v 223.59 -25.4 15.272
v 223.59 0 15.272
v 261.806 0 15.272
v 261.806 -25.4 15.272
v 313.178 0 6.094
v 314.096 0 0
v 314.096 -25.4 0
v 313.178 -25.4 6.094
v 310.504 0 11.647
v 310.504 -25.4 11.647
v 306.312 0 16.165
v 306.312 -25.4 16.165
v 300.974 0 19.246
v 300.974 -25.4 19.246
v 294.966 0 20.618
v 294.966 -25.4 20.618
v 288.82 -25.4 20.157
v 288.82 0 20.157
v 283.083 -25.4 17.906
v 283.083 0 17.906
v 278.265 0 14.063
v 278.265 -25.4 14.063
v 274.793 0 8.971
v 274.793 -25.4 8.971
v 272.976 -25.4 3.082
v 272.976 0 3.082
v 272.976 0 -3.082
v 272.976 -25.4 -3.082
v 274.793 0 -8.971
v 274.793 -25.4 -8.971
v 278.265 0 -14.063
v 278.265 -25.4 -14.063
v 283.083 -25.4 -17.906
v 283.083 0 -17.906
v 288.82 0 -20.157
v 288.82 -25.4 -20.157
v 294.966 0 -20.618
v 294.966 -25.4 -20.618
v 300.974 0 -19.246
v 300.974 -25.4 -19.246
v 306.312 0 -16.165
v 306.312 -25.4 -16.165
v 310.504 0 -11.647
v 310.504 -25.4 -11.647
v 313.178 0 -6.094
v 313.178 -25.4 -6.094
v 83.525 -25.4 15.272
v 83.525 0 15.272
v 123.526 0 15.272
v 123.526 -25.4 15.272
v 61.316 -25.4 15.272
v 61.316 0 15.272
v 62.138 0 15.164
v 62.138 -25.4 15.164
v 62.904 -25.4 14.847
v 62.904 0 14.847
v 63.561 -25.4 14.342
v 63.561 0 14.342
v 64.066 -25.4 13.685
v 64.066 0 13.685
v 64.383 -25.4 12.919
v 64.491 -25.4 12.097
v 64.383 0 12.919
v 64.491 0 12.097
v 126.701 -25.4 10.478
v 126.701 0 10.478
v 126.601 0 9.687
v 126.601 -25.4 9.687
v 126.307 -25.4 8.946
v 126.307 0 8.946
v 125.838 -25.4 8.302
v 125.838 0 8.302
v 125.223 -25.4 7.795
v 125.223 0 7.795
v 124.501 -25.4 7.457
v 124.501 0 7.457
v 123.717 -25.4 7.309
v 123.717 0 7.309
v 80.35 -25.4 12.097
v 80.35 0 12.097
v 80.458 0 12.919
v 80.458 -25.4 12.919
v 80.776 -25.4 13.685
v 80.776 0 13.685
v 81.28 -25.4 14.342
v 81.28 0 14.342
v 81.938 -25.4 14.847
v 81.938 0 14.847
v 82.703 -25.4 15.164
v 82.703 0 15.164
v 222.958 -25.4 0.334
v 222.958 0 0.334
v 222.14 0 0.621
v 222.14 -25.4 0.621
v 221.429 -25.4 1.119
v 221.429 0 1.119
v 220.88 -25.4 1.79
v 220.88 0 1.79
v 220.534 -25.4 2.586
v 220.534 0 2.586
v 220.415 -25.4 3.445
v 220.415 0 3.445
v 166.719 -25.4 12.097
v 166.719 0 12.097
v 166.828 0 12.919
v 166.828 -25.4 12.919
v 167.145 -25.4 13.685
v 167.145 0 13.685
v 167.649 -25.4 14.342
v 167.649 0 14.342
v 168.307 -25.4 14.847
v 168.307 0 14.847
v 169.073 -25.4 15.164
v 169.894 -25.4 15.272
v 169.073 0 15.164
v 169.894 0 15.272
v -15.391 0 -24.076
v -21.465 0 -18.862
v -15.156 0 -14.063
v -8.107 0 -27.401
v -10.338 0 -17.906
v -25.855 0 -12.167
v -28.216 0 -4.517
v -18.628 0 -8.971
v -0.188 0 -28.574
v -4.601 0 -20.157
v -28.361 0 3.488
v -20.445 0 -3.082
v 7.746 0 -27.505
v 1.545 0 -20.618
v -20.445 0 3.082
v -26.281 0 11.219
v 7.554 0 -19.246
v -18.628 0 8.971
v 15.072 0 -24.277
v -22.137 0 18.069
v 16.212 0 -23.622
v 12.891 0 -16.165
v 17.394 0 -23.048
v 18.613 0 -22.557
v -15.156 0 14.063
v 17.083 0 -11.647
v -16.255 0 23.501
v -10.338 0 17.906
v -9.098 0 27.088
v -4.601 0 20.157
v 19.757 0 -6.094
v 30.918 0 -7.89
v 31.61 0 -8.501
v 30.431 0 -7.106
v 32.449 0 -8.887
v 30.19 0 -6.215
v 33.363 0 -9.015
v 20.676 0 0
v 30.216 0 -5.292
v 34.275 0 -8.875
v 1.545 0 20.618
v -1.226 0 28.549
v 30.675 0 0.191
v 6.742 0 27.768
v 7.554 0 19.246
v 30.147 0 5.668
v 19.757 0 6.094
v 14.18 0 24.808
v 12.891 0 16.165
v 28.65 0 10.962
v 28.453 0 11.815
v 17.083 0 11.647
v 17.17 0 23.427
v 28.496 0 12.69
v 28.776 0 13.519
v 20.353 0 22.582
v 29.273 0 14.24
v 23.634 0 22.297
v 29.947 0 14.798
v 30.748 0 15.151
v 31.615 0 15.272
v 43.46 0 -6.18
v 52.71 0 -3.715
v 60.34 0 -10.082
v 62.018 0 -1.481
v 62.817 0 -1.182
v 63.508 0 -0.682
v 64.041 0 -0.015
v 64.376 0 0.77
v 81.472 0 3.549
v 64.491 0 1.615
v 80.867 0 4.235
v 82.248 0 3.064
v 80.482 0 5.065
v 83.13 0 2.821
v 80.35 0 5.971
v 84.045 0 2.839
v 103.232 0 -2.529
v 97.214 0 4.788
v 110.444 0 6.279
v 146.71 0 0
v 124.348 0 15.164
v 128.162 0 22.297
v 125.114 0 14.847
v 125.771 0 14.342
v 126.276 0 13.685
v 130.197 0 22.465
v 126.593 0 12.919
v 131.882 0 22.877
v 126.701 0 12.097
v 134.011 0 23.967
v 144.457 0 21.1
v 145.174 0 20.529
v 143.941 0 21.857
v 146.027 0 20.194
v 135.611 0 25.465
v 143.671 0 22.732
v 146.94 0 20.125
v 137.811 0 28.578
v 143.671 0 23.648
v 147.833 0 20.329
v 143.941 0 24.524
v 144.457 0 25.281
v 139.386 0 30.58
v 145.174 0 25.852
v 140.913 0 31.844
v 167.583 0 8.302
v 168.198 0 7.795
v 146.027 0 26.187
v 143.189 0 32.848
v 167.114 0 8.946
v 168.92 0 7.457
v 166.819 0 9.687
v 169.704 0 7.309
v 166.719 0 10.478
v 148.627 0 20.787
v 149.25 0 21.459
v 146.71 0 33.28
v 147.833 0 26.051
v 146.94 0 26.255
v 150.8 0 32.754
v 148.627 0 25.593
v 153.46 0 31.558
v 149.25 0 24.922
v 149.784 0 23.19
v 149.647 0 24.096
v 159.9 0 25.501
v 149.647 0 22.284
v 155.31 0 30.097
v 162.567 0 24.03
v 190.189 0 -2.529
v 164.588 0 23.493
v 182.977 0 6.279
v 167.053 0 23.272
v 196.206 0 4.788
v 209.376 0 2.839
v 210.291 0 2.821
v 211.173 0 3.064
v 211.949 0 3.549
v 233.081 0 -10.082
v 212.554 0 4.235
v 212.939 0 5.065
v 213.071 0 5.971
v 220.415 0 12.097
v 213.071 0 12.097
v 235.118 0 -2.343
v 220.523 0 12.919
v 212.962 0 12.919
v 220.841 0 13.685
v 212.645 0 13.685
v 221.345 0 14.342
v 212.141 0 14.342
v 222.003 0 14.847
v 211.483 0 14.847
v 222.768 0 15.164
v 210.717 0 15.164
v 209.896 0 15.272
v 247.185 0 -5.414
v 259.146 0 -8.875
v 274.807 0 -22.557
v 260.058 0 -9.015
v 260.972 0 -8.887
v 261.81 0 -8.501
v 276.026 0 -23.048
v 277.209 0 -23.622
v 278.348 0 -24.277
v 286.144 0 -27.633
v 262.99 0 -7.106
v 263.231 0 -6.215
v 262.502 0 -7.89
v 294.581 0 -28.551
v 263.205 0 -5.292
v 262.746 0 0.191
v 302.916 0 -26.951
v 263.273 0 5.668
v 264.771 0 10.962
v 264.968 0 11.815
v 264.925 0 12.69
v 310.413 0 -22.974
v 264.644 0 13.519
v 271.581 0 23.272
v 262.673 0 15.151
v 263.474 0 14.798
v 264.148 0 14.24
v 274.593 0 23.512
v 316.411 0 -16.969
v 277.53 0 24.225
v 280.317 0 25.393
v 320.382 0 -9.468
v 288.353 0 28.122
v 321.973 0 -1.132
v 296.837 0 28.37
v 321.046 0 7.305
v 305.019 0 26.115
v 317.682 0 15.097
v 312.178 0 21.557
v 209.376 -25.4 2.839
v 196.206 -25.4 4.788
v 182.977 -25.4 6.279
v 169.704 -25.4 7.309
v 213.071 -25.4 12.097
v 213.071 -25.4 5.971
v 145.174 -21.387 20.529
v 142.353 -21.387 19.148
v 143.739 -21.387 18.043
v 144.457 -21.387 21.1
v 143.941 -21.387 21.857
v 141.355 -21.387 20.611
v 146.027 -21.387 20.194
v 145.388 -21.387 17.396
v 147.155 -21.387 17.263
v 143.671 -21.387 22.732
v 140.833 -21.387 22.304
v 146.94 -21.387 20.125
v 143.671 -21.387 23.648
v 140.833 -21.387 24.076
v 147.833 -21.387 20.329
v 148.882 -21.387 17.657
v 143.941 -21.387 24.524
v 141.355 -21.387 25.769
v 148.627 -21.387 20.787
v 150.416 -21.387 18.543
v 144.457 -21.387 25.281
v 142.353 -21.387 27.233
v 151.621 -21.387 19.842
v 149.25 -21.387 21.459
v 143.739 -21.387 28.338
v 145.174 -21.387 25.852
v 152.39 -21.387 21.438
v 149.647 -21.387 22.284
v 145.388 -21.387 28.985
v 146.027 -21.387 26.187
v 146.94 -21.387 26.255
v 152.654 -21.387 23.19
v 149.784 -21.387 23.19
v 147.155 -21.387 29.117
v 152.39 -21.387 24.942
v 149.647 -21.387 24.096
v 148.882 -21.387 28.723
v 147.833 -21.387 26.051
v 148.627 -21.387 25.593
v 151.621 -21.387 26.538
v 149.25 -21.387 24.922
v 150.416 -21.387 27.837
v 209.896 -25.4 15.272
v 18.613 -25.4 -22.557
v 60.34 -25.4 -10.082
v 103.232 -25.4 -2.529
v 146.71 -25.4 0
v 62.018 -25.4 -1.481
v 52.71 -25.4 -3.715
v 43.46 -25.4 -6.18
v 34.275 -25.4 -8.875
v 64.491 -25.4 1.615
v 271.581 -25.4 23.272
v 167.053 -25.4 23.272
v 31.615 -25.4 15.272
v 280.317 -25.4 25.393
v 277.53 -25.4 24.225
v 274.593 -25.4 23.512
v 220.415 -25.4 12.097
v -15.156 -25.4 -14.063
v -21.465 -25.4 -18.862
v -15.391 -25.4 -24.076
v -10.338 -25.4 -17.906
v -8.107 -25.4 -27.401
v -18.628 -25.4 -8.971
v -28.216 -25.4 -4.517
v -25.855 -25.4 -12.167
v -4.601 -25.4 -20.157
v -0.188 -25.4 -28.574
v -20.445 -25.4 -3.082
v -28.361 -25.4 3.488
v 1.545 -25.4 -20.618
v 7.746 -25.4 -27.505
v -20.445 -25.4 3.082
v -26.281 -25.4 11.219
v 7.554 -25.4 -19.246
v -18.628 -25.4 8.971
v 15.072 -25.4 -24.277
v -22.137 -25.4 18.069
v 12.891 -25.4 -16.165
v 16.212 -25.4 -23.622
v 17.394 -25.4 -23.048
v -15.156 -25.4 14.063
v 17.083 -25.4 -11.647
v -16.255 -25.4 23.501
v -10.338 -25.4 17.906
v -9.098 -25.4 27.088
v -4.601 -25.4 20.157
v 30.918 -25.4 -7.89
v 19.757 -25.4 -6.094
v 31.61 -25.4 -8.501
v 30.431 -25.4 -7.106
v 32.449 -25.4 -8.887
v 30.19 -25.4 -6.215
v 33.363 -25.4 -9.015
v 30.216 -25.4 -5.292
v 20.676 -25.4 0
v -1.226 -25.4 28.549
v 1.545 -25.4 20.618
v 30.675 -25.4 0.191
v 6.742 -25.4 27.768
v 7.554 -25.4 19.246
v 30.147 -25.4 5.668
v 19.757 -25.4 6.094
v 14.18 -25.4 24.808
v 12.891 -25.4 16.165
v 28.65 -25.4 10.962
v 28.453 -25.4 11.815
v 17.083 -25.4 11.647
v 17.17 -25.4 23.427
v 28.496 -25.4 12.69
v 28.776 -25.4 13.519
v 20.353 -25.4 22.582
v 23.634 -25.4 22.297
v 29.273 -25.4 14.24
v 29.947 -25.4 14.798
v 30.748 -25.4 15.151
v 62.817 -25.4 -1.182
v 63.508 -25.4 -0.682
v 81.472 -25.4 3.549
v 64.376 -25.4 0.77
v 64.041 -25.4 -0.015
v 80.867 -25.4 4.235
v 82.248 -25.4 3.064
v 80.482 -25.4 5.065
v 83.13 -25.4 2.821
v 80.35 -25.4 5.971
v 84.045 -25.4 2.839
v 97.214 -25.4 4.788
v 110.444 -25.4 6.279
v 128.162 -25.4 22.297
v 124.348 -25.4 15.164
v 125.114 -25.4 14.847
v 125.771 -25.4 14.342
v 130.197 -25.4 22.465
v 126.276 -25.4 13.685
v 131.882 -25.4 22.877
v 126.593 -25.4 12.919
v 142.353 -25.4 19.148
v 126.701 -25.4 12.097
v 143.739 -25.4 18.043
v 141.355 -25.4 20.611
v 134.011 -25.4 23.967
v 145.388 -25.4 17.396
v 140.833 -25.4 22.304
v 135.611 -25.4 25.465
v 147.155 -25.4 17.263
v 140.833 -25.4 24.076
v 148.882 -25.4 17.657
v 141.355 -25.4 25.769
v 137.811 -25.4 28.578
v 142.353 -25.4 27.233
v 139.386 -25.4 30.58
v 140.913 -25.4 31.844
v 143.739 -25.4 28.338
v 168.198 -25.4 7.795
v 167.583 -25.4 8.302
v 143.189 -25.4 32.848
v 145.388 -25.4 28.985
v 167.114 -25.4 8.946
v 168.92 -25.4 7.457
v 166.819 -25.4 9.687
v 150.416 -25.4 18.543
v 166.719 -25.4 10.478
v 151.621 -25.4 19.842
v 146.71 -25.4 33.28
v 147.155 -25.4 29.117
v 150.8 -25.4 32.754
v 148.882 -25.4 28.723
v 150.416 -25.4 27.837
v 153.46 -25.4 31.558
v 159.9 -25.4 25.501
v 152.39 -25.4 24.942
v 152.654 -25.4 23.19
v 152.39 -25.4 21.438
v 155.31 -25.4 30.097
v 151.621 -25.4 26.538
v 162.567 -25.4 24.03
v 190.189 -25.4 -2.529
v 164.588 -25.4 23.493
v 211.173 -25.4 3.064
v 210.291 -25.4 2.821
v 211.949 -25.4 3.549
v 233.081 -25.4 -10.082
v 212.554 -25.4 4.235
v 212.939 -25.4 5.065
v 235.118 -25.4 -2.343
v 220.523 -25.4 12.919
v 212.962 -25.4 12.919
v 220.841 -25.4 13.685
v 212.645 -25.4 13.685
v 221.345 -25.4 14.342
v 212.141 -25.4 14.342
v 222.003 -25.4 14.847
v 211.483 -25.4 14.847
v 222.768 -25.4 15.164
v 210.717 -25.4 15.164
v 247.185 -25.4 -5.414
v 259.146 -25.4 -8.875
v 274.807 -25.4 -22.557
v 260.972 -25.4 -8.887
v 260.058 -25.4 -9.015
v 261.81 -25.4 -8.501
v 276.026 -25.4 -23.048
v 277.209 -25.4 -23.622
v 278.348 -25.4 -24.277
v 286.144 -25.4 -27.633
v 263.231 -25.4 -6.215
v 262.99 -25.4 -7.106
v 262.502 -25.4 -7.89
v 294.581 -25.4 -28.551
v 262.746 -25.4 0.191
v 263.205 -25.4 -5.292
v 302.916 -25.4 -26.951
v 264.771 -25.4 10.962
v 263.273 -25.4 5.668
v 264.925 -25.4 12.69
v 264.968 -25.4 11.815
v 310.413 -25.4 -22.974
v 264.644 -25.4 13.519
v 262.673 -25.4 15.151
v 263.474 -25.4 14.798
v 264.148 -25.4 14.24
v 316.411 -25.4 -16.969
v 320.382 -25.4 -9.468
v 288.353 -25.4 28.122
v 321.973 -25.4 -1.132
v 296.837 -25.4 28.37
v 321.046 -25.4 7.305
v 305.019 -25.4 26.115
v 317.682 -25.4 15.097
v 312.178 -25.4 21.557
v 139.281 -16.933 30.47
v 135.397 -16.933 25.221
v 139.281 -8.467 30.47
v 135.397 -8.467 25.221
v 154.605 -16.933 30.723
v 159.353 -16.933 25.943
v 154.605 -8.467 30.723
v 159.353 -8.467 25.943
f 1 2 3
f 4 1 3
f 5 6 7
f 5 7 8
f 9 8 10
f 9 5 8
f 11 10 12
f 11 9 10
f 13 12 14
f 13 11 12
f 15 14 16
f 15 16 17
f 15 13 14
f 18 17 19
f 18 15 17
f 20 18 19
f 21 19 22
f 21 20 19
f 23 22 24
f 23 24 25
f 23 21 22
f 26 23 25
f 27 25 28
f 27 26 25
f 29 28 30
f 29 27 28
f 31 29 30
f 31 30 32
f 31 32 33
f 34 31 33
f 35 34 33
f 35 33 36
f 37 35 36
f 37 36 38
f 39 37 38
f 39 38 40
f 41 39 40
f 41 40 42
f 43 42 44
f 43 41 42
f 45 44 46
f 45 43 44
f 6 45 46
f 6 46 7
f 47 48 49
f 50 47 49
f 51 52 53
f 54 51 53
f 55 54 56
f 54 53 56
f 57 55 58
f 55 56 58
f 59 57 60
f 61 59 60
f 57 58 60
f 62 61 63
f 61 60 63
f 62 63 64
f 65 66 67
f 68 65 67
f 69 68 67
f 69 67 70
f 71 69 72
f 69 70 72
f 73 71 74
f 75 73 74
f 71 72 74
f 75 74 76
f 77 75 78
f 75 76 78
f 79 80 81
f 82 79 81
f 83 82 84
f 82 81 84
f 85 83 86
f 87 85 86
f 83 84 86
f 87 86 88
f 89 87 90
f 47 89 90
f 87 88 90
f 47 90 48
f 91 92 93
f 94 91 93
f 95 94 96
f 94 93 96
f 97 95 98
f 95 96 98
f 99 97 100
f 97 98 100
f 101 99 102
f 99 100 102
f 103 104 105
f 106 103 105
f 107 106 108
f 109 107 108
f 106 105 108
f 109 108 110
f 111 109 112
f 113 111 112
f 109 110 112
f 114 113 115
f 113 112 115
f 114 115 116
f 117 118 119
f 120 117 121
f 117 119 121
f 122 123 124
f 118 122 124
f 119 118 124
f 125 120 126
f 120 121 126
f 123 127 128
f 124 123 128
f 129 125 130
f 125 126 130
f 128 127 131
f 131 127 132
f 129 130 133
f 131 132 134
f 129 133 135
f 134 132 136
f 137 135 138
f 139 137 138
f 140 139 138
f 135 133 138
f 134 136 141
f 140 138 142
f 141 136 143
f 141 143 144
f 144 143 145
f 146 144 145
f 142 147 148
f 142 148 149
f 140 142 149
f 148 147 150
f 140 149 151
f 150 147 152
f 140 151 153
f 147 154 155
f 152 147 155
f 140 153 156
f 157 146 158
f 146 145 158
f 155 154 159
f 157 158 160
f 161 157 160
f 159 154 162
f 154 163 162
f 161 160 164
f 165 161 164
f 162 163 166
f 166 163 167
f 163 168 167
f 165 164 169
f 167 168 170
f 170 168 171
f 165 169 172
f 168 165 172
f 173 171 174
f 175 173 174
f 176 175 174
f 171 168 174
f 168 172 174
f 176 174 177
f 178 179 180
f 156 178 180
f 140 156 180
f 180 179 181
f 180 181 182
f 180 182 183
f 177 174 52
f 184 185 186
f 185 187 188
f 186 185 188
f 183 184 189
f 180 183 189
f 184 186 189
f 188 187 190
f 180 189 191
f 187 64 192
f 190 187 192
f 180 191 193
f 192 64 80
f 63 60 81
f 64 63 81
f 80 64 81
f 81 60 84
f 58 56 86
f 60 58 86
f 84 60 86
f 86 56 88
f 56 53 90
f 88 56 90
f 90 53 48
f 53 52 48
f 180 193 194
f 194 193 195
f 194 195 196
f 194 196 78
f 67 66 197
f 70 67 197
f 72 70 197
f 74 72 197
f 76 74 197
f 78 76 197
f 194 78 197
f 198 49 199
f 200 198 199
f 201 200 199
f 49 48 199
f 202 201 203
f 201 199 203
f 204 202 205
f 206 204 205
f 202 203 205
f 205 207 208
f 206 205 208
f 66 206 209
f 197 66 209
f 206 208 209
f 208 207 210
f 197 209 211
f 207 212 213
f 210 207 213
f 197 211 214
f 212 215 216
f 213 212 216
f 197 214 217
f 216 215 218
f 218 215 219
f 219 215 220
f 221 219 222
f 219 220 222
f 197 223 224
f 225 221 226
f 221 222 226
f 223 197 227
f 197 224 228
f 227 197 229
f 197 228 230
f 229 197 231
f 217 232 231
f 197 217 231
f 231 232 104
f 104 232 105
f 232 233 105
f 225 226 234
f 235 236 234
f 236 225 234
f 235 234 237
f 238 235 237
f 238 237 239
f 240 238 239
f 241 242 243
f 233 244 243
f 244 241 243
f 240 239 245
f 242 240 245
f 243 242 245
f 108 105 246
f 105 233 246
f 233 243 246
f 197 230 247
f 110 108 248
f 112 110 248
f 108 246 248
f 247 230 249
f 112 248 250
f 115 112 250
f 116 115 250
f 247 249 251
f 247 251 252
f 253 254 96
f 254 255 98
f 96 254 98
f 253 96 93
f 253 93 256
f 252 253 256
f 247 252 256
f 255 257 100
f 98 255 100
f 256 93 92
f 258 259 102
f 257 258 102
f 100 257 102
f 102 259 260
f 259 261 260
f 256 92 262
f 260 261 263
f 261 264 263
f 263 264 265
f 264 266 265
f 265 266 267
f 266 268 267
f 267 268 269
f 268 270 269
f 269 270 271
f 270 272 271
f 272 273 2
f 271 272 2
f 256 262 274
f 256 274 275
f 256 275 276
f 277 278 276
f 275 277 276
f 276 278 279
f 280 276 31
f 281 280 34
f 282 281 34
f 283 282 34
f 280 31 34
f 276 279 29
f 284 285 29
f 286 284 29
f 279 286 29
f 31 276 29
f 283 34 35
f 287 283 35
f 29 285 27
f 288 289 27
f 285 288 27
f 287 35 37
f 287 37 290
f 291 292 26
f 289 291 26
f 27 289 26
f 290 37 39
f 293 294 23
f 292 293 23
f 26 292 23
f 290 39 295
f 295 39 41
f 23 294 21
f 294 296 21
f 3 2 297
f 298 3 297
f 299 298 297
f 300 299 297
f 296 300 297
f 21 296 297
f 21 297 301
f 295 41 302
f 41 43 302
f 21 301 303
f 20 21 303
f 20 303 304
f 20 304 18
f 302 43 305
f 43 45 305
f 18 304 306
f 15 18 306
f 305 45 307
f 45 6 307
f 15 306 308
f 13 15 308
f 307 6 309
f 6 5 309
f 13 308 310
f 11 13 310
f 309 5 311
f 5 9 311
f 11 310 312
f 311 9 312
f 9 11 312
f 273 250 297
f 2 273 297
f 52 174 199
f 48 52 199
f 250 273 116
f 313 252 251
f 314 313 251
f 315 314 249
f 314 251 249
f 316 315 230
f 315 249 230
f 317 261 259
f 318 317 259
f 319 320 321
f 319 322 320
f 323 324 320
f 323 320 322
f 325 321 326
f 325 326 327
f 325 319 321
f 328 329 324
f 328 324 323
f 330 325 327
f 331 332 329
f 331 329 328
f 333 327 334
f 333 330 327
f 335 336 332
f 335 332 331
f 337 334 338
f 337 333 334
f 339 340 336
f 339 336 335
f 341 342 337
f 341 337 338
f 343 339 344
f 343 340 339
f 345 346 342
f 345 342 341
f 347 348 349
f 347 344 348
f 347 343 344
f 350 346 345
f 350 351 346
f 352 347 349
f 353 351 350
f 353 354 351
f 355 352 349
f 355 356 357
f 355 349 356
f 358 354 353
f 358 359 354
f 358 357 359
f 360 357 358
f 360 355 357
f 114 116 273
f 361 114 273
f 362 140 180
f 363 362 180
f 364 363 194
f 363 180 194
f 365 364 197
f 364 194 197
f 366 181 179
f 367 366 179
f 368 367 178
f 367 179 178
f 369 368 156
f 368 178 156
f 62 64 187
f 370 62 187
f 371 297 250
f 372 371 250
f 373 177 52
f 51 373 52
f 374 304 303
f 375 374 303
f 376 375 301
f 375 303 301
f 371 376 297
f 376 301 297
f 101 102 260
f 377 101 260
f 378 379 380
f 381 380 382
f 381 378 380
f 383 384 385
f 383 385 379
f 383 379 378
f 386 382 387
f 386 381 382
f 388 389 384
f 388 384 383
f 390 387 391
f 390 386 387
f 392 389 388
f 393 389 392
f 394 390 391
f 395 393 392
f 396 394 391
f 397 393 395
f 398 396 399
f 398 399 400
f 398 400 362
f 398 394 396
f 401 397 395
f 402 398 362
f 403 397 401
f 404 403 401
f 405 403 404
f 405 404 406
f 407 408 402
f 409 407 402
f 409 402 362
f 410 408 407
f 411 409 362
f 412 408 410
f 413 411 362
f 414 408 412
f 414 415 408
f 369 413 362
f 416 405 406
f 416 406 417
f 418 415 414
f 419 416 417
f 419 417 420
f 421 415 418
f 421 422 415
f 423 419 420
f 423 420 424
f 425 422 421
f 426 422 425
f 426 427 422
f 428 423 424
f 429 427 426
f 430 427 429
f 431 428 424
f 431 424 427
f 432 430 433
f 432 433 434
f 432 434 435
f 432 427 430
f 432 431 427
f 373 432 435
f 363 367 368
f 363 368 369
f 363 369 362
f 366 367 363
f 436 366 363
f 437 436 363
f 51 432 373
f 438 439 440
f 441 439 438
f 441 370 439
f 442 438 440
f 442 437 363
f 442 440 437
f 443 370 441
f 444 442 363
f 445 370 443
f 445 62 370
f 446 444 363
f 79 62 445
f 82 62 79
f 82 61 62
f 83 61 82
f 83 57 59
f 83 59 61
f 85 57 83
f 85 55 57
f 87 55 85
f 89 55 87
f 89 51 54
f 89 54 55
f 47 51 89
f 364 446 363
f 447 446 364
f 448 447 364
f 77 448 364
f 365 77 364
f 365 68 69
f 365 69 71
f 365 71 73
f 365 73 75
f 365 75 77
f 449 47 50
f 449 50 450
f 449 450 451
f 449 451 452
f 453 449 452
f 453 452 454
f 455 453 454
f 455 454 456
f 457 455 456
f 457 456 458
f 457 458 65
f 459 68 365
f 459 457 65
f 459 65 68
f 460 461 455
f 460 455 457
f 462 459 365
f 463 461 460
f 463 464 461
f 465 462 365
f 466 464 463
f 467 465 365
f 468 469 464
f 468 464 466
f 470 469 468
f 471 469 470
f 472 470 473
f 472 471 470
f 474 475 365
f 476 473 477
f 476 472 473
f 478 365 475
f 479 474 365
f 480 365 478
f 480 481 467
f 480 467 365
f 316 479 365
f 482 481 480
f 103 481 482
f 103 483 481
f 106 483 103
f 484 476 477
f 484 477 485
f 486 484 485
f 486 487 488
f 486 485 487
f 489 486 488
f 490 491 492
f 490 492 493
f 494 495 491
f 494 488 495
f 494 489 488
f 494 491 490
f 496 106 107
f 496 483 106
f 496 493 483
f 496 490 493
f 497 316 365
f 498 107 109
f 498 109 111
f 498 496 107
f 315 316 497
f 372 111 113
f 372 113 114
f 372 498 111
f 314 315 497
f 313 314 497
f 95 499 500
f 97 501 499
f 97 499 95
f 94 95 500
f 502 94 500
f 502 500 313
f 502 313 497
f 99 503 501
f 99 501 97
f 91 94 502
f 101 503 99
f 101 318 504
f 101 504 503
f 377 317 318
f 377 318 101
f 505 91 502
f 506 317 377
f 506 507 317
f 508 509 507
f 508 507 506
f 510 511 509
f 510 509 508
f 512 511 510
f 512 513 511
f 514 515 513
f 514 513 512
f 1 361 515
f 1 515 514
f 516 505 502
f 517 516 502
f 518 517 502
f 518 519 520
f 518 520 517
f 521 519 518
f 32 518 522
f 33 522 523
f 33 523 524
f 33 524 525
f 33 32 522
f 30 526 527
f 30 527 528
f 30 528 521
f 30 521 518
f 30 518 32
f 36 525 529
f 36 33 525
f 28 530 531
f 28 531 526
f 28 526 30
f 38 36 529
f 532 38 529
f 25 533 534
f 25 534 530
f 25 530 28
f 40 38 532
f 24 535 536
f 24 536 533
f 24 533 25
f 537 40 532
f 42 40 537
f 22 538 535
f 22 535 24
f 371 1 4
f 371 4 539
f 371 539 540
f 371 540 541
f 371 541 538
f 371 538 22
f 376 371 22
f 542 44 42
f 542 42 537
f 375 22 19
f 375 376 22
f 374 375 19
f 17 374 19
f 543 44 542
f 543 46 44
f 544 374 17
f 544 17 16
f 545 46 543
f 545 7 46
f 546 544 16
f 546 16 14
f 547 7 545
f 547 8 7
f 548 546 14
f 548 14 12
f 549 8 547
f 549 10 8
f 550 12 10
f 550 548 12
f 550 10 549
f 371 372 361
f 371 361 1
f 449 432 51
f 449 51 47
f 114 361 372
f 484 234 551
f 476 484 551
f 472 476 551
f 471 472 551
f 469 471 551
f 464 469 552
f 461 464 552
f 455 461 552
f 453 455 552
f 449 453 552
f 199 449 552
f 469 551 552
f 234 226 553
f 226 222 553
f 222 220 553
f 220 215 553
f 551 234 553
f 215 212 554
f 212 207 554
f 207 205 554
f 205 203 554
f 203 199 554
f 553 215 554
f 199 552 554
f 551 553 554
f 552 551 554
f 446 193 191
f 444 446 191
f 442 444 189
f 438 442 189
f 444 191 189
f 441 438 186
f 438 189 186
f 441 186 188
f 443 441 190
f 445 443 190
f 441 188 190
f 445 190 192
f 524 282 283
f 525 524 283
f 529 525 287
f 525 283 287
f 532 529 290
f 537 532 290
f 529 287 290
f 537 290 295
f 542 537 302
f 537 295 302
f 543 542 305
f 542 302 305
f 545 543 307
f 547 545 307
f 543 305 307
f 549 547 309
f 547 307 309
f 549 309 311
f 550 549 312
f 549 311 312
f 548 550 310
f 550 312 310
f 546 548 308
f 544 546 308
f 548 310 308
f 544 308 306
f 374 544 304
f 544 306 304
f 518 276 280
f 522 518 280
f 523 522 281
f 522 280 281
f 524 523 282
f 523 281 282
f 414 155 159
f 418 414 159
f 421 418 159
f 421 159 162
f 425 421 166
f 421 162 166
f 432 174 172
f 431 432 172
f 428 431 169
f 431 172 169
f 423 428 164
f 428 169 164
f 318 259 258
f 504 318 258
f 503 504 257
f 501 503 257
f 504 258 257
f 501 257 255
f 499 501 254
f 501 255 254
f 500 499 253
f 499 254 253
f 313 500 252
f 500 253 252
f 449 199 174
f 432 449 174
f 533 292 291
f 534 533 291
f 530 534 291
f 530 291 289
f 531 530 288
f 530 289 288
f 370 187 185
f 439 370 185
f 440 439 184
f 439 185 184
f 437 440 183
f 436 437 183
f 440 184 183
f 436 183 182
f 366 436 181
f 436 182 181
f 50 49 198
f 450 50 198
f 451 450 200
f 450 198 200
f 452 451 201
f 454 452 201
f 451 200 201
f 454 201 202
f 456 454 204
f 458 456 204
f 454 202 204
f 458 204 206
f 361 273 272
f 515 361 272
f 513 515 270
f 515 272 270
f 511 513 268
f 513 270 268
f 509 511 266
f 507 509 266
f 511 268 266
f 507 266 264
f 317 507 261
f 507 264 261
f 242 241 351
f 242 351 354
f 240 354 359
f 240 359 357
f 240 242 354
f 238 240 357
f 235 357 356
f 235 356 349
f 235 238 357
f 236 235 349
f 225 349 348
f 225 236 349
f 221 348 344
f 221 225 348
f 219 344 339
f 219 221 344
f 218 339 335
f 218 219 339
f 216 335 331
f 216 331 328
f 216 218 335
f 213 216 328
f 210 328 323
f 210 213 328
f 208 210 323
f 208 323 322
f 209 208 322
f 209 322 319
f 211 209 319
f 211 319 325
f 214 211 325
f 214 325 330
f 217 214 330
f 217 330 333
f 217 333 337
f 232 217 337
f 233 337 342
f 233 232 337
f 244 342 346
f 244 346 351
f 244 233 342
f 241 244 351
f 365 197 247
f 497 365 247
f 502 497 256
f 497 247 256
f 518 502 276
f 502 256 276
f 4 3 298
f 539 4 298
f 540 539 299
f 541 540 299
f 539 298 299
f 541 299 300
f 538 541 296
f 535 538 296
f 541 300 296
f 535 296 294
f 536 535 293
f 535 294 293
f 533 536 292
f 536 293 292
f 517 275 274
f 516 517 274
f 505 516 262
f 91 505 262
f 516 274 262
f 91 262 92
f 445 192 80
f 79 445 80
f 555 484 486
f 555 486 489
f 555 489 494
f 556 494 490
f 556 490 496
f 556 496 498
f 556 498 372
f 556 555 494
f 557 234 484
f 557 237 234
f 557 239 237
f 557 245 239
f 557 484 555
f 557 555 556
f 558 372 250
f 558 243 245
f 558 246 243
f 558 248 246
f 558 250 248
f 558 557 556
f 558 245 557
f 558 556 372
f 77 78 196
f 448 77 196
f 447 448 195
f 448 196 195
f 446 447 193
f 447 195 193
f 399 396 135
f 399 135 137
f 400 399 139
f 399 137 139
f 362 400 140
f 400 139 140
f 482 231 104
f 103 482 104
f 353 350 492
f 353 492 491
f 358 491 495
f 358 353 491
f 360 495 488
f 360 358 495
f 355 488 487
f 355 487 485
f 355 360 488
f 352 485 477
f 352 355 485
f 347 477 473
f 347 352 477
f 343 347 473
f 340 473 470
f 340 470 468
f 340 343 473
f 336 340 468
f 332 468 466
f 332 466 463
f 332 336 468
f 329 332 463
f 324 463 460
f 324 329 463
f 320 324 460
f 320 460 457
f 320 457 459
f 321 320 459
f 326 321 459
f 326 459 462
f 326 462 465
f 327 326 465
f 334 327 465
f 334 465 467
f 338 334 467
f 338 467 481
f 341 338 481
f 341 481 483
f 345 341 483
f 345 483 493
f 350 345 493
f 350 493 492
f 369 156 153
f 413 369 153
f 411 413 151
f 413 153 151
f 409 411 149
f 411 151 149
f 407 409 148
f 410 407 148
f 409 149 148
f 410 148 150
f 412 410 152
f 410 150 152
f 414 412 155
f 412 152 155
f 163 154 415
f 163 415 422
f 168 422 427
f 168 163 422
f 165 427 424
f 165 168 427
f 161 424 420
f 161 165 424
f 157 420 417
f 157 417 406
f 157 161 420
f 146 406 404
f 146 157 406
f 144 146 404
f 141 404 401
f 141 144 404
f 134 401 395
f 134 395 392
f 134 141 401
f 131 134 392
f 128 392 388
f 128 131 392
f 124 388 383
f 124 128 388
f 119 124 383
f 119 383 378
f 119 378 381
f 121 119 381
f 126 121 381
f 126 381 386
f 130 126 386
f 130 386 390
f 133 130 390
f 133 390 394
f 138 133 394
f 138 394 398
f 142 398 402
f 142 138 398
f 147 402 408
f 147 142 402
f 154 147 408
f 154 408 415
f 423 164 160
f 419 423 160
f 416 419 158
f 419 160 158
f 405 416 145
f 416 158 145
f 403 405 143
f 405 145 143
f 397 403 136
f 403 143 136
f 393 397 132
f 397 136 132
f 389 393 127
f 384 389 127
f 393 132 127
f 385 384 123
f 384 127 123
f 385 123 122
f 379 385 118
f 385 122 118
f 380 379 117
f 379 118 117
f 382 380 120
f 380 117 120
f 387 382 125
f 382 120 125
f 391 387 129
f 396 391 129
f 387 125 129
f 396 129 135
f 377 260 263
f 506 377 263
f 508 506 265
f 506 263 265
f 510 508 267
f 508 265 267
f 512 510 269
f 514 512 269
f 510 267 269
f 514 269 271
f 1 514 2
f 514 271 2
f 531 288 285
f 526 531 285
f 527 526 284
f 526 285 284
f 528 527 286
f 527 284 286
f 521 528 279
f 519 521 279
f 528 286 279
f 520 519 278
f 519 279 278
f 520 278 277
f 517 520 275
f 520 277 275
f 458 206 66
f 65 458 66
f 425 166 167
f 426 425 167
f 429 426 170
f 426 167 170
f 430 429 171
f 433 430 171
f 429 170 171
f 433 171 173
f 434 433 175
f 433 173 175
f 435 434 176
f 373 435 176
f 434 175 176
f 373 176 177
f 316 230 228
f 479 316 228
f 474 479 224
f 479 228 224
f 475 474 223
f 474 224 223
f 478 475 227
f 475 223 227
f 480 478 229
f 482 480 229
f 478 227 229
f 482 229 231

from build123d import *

# Parameters (mm, degrees)
F0_R     = 20.6756
F0_R_2   = 5.9436
F1_DEPTH = 25.4
F0_R_3   = 3.0734
F2_DEPTH = 21.3868


with BuildPart() as f1:
    # F0 (on Front) → F1 (new body)
    with BuildSketch(Plane.XZ):
        with BuildLine():
            Line((271.580863, 23.272072), (167.052843, 23.272072))
            add(Edge.make_bspline(
                [(146.7104, 33.279704), (158.211127, 33.278), (155.84334, 23.444525), (167.052843, 23.272072)],
                knots=[0, 0, 0, 0, 22.670855, 22.670855, 22.670855, 22.670855], degree=3))
            add(Edge.make_bspline(
                [(146.7104, 33.279704), (135.209673, 33.278), (139.371195, 22.469644), (128.161692, 22.297191)],
                knots=[0, 0, 0, 0, 21.55621, 21.55621, 21.55621, 21.55621], degree=3))
            Line((128.161692, 22.297191), (23.633672, 22.297191))
            ThreePointArc((23.633672, 22.297191), (18.743023, 22.935671), (14.180203, 24.808314))
            ThreePointArc((14.180203, 24.808314), (-28.570281, -0.519307), (15.072395, -24.276605))
            ThreePointArc((15.072395, -24.276605), (16.798322, -23.325045), (18.613326, -22.556899))
            ThreePointArc((18.613326, -22.556899), (81.676421, -5.682276), (146.7104, 0))
            ThreePointArc((146.7104, 0), (211.744379, -5.682276), (274.807474, -22.556899))
            ThreePointArc((274.807474, -22.556899), (276.622478, -23.325045), (278.348405, -24.276605))
            ThreePointArc((278.348405, -24.276605), (321.973387, -1.131548), (280.316838, 25.393243))
            ThreePointArc((280.316838, 25.393243), (276.075766, 23.809958), (271.580863, 23.272072))
        make_face()
        Circle(F0_R, mode=Mode.SUBTRACT)
        with Locations((293.4208, 0)):
            Circle(F0_R, mode=Mode.SUBTRACT)
        with BuildLine():
            ThreePointArc((61.316134, 15.272072), (63.561198, 14.342136), (64.491134, 12.097072))
            Line((64.491134, 12.097072), (64.491134, 1.615122))
            ThreePointArc((64.491134, 1.615122), (63.797035, -0.36623), (62.018216, -1.48128))
            ThreePointArc((62.018216, -1.48128), (48.077329, -4.918229), (34.275062, -8.875302))
            ThreePointArc((34.275062, -8.875302), (31.242012, -8.220636), (30.215605, -5.292417))
            ThreePointArc((30.215605, -5.292417), (30.534281, 2.941109), (28.649913, 10.962433))
            ThreePointArc((28.649913, 10.962433), (28.999613, 13.896814), (31.615249, 15.272072))
            Line((31.615249, 15.272072), (61.316134, 15.272072))
        make_face(mode=Mode.SUBTRACT)
        with BuildLine():
            Line((83.525193, 15.272072), (123.526418, 15.272072))
            ThreePointArc((123.526418, 15.272072), (125.771482, 14.342136), (126.701418, 12.097072))
            Line((126.701418, 12.097072), (126.701418, 10.478448))
            ThreePointArc((126.701418, 10.478448), (125.837891, 8.301818), (123.717029, 7.309174))
            ThreePointArc((123.717029, 7.309174), (103.822564, 5.591163), (84.044681, 2.8386))
            ThreePointArc((84.044681, 2.8386), (81.471994, 3.549037), (80.350193, 5.970813))
            Line((80.350193, 5.970813), (80.350193, 12.097072))
            ThreePointArc((80.350193, 12.097072), (81.280129, 14.342136), (83.525193, 15.272072))
        make_face(mode=Mode.SUBTRACT)
        with Locations((146.7104, 23.1902)):
            Circle(F0_R_2, mode=Mode.SUBTRACT)
        with BuildLine():
            ThreePointArc((213.070607, 5.970813), (211.948806, 3.549037), (209.376119, 2.8386))
            ThreePointArc((209.376119, 2.8386), (189.598236, 5.591163), (169.703771, 7.309174))
            ThreePointArc((169.703771, 7.309174), (167.582909, 8.301818), (166.719382, 10.478448))
            Line((166.719382, 10.478448), (166.719382, 12.097072))
            ThreePointArc((166.719382, 12.097072), (167.649318, 14.342136), (169.894382, 15.272072))
            Line((169.894382, 15.272072), (209.895607, 15.272072))
            ThreePointArc((209.895607, 15.272072), (212.140671, 14.342136), (213.070607, 12.097072))
            Line((213.070607, 12.097072), (213.070607, 5.970813))
        make_face(mode=Mode.SUBTRACT)
        with BuildLine():
            ThreePointArc((261.805551, 15.272072), (264.421187, 13.896814), (264.770887, 10.962433))
            ThreePointArc((264.770887, 10.962433), (262.886519, 2.941109), (263.205195, -5.292417))
            ThreePointArc((263.205195, -5.292417), (262.178788, -8.220636), (259.145738, -8.875302))
            ThreePointArc((259.145738, -8.875302), (241.164238, -3.829591), (222.958148, 0.333559))
            ThreePointArc((222.958148, 0.333559), (221.131826, 1.435806), (220.415228, 3.445006))
            Line((220.415228, 3.445006), (220.415228, 12.097072))
            ThreePointArc((220.415228, 12.097072), (221.345164, 14.342136), (223.590228, 15.272072))
            Line((223.590228, 15.272072), (261.805551, 15.272072))
        make_face(mode=Mode.SUBTRACT)
    extrude(amount=F1_DEPTH)

    # F0 (on Front) → F2 (join)
    with BuildSketch(Plane.XZ):
        with Locations((146.7104, 23.1902)):
            Circle(F0_R_2)
        with Locations((146.7104, 23.1902)):
            Circle(F0_R_3, mode=Mode.SUBTRACT)
    extrude(amount=F2_DEPTH)


solid = f1.part
